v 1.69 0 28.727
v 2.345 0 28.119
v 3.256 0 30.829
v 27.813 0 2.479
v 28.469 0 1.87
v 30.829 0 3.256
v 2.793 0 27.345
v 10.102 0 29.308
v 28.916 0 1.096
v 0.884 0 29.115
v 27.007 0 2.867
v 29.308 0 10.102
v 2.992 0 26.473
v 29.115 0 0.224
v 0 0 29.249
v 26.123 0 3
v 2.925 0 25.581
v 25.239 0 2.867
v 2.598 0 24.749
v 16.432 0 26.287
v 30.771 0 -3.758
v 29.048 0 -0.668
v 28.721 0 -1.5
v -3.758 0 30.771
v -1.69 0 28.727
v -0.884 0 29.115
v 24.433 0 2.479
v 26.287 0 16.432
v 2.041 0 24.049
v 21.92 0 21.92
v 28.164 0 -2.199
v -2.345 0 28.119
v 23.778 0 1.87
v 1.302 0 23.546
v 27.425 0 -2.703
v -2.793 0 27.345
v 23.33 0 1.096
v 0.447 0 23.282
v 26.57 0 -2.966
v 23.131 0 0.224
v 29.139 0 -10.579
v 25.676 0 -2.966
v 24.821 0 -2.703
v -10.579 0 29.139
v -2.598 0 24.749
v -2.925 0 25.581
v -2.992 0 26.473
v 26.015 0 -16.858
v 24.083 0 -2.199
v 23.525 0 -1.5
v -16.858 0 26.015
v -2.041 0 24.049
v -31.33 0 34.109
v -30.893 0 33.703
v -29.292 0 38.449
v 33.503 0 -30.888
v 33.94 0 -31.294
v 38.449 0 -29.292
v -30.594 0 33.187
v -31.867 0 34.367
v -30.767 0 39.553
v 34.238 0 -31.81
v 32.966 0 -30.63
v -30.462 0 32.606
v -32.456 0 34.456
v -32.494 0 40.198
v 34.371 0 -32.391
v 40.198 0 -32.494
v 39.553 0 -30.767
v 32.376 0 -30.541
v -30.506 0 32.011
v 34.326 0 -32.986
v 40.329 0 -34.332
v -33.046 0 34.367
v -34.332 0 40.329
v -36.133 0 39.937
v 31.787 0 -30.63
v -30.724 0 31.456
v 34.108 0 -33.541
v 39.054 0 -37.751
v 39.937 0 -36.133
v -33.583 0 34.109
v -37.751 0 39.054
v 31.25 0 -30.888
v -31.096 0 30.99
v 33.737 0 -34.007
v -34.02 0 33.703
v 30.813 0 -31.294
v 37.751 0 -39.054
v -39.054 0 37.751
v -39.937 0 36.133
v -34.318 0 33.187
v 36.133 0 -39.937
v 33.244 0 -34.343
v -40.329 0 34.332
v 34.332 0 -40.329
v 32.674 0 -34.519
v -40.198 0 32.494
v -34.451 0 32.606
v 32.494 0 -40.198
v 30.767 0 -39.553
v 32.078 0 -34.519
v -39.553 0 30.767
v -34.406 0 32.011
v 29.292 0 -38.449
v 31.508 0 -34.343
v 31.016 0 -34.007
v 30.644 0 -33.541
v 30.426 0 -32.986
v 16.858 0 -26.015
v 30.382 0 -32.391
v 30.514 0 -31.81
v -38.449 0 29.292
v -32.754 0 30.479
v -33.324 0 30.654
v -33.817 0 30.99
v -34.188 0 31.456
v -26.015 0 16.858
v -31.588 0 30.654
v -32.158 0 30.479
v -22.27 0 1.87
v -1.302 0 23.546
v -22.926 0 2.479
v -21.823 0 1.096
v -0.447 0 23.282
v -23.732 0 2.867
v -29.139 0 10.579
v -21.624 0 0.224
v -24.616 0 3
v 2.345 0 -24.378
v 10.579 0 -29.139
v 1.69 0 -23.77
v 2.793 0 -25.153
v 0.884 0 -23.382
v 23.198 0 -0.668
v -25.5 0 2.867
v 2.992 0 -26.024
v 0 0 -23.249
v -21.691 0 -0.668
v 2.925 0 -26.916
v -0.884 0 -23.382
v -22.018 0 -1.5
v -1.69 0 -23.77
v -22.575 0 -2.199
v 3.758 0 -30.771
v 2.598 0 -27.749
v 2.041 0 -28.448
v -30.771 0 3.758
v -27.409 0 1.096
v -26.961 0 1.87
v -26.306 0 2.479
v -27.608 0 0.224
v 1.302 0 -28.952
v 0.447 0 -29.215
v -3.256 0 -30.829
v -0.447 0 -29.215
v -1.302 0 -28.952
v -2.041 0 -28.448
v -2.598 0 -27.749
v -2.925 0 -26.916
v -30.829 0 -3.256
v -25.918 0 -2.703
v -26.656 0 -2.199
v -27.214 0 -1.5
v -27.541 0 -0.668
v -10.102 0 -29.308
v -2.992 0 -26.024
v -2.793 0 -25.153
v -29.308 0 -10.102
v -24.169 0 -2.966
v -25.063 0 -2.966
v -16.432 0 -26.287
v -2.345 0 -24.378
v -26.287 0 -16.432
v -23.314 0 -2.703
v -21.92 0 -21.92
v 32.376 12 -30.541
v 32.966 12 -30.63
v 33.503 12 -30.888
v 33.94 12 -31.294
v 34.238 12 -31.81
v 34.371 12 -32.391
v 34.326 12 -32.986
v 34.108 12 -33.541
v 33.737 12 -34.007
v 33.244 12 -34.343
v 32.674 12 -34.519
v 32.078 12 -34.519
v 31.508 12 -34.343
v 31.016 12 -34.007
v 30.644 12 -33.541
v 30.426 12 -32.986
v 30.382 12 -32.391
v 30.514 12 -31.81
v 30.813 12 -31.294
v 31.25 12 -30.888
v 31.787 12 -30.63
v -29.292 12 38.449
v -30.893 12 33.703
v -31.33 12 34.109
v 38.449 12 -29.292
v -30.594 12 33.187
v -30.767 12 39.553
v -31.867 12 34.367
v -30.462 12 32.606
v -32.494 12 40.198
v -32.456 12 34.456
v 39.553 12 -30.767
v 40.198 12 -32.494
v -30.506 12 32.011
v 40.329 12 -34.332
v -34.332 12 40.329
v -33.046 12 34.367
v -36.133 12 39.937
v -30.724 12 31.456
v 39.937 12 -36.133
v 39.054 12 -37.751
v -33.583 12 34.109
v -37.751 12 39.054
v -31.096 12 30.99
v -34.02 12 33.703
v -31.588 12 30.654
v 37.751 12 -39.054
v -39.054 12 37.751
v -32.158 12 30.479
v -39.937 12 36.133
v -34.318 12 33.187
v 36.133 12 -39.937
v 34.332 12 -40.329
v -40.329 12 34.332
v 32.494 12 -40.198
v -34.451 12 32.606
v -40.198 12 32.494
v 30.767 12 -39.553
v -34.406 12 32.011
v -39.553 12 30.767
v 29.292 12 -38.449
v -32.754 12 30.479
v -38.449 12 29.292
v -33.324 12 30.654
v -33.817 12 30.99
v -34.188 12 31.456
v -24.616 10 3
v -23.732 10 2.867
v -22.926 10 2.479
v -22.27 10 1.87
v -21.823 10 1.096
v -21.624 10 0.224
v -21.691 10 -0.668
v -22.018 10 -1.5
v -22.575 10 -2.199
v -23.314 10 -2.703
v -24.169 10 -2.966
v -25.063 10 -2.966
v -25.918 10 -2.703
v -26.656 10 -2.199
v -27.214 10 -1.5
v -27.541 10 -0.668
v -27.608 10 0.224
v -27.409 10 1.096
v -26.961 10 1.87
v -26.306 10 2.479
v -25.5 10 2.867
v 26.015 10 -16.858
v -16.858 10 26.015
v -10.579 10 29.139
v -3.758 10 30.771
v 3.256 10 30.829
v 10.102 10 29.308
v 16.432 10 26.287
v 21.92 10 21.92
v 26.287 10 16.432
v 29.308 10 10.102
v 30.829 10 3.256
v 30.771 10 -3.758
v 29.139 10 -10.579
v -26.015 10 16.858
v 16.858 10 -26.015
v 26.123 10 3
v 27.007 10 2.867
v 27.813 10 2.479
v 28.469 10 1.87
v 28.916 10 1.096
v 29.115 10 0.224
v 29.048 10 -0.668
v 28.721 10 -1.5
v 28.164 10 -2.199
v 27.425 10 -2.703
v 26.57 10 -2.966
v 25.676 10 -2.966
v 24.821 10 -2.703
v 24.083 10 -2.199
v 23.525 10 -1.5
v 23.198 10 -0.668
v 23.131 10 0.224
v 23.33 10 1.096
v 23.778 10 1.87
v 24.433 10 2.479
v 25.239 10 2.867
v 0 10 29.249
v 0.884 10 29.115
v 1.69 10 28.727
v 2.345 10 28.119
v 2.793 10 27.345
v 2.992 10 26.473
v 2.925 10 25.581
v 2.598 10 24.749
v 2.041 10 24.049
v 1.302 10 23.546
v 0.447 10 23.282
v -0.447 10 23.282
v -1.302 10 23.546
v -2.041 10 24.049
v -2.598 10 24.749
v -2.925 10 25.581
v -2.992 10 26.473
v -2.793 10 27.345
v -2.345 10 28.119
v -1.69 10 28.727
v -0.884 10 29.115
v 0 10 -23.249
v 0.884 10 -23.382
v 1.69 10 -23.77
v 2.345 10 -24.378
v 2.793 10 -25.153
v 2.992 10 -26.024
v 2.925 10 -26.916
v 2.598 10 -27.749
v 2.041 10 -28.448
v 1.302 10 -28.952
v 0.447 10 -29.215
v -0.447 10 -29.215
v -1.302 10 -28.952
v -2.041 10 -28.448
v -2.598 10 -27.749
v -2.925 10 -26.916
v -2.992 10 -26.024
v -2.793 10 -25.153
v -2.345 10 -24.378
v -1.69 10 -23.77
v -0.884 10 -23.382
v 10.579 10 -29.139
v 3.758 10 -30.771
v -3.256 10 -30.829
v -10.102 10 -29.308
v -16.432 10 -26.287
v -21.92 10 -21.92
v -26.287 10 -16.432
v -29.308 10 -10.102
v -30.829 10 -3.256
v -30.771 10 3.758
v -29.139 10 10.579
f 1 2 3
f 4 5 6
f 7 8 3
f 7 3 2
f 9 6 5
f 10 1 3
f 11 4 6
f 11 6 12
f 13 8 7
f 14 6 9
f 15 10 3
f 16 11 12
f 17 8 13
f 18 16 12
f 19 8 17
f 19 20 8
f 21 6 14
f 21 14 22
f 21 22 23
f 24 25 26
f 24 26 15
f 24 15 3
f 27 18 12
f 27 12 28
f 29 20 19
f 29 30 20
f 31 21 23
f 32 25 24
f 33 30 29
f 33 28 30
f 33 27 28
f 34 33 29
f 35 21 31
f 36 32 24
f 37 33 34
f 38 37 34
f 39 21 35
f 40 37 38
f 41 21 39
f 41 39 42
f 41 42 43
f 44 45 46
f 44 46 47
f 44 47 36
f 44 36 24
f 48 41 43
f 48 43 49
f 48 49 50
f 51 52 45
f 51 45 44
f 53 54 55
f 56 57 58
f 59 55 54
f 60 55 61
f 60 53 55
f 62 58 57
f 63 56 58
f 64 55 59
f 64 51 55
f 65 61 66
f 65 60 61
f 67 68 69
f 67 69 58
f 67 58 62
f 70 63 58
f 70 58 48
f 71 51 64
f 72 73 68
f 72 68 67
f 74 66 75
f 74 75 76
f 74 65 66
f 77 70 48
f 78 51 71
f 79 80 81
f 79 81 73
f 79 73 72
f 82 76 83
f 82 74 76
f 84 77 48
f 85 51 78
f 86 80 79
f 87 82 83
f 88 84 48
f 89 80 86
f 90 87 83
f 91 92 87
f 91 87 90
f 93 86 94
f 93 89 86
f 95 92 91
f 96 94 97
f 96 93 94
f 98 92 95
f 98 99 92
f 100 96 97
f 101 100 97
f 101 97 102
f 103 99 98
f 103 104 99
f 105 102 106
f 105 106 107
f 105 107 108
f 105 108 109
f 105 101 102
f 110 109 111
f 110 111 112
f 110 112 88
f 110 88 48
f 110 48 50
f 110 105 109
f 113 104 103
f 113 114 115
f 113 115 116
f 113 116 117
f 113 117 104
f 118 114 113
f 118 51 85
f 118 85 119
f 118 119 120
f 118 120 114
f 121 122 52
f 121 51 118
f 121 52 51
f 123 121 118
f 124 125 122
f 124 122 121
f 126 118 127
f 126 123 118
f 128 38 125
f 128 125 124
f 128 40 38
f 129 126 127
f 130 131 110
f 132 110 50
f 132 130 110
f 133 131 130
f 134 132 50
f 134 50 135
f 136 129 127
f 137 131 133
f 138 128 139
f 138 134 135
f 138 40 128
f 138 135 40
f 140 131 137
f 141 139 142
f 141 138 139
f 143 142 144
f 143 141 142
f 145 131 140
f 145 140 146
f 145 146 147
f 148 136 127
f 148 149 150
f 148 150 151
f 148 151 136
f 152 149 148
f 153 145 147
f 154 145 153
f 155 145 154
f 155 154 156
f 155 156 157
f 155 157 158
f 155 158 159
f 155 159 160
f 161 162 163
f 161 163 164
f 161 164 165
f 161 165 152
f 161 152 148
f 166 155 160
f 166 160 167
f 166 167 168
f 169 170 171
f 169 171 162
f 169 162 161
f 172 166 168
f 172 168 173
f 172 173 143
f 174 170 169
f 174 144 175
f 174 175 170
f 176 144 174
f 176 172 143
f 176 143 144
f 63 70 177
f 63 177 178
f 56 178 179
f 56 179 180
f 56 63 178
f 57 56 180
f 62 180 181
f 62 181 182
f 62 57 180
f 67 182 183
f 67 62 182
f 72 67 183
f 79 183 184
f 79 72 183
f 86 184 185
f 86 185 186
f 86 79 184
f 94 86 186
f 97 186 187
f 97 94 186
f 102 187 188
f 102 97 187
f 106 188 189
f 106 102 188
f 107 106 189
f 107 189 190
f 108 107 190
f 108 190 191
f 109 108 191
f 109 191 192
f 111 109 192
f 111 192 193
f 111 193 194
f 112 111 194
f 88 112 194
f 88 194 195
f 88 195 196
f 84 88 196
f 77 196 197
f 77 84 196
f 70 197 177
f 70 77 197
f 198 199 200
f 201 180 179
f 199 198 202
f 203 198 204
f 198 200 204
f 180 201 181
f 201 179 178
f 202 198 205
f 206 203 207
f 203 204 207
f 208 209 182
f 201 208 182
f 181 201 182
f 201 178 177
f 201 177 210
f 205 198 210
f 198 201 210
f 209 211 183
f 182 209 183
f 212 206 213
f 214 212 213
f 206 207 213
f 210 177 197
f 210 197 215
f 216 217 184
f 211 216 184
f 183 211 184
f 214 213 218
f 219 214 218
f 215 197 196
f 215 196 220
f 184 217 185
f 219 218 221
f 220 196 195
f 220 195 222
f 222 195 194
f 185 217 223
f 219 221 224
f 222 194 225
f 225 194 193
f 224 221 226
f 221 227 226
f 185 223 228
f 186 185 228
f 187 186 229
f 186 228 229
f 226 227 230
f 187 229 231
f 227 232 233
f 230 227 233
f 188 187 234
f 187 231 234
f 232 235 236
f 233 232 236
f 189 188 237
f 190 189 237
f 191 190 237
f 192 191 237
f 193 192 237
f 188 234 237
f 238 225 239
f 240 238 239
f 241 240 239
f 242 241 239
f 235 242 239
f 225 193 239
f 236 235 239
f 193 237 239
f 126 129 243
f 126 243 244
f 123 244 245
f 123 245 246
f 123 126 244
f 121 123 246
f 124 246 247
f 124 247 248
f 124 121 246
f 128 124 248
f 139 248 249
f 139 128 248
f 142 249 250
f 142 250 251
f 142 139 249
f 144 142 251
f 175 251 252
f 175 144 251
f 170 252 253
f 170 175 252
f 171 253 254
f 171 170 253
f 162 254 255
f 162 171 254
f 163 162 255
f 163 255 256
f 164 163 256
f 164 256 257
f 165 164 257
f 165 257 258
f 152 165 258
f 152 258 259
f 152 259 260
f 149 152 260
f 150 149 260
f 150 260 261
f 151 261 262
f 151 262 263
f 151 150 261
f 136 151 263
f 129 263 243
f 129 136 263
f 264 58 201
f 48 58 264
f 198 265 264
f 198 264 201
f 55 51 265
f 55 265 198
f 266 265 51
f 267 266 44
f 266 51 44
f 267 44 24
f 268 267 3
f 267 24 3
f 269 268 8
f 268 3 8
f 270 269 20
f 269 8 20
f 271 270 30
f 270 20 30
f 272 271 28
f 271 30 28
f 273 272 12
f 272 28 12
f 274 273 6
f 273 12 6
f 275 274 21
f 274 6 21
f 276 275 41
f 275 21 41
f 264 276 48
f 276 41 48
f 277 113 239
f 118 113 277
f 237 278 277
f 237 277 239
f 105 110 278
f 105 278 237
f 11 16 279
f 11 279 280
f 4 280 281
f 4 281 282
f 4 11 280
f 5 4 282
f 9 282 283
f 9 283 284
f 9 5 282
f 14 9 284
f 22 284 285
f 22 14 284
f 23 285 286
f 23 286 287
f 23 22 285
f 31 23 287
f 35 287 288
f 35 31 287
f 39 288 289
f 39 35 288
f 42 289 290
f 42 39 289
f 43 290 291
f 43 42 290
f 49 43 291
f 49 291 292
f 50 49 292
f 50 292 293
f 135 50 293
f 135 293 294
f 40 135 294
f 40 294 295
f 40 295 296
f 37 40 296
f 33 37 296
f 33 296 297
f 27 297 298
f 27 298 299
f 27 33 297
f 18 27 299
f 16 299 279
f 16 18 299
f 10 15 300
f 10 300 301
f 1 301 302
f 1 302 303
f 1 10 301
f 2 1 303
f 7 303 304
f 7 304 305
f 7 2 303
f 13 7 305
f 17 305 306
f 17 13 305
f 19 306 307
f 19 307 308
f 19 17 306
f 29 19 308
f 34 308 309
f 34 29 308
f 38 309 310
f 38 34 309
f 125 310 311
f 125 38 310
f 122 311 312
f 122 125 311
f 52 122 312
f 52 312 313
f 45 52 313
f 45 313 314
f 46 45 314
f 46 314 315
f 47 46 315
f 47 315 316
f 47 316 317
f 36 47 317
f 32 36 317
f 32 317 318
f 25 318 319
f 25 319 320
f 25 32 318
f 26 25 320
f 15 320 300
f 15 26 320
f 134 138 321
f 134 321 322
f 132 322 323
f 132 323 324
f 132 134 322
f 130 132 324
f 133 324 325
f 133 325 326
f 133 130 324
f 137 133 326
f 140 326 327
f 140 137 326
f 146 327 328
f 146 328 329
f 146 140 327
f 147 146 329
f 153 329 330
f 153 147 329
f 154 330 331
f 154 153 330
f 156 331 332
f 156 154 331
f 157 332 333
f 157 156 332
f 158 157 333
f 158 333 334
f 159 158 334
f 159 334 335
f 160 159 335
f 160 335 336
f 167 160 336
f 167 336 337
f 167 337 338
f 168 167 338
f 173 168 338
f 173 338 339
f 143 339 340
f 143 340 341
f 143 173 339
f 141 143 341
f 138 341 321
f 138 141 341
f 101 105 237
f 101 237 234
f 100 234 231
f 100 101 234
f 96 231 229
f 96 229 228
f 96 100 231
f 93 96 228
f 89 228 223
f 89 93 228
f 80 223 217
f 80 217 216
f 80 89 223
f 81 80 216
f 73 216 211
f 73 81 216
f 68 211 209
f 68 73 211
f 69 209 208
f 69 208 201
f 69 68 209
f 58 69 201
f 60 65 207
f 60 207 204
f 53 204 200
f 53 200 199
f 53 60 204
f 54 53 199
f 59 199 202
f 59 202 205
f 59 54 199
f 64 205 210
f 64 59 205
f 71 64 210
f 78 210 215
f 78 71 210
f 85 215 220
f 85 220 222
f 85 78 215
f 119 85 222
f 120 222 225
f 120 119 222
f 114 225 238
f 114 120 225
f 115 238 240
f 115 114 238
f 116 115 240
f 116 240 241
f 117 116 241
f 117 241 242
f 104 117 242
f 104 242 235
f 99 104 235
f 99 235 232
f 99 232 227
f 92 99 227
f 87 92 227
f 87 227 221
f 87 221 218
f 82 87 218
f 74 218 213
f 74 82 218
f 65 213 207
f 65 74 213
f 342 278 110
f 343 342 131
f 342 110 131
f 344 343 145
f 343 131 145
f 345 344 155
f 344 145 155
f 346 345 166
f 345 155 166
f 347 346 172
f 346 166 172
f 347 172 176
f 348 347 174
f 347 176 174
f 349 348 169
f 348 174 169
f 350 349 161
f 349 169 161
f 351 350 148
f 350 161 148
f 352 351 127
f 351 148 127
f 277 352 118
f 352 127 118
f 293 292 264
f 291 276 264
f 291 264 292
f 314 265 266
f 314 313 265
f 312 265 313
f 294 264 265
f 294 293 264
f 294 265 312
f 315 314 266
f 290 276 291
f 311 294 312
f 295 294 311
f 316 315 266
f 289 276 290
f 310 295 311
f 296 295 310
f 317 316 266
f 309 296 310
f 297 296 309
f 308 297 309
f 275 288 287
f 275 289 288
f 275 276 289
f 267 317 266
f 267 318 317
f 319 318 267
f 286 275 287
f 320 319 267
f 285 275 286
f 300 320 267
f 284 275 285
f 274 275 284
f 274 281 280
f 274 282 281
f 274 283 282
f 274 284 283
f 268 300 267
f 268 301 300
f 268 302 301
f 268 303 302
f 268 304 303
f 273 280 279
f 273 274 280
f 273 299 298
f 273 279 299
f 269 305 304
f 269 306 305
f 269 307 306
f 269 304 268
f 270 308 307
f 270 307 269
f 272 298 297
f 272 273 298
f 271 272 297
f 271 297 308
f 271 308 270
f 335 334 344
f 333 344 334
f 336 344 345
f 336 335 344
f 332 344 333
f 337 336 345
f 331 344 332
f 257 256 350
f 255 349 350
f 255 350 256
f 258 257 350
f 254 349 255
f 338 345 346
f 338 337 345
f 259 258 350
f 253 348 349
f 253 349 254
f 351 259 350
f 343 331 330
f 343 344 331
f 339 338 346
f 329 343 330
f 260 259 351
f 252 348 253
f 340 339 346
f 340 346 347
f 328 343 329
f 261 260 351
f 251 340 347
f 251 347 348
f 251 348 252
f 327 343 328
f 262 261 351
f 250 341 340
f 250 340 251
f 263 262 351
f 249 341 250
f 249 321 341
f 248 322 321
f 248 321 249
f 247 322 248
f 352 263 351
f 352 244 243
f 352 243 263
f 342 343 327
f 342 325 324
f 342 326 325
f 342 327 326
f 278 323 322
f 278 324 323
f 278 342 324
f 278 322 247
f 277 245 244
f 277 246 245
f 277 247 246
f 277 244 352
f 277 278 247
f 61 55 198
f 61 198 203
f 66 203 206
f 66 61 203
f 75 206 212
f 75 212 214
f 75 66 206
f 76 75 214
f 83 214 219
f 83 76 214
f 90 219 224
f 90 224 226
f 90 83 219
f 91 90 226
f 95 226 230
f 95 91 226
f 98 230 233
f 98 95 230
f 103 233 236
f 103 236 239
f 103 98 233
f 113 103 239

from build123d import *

# Parameters (mm, degrees)
SKETCH6_R           = 31
BOSS_EXTRUDE3_DEPTH = 10
SKETCH7_R           = 3
CUT_EXTRUDE4_DEPTH  = 10
SKETCH8_R           = 2
BOSS_EXTRUDE8_DEPTH = 12


with BuildPart() as part:
    # Sketch6 → Boss-Extrude3 (new body)
    with BuildSketch(Plane(origin=(0, 0, 0), x_dir=(1, 0, 0), z_dir=(0, 1, 0))):
        with Locations(Location((0, 0, 0), (0, 0, 270))):
            Circle(SKETCH6_R)
    extrude(amount=BOSS_EXTRUDE3_DEPTH)

    # Sketch7 → Cut-Extrude4 (cut)
    with BuildSketch(Plane(origin=(0, 0, 0), x_dir=(1, 0, 0), z_dir=(0, 1, 0))):
        with Locations(Location((0, 26.248619222, 0), (0, 0, 270))):
            Circle(SKETCH7_R)
        with Locations(Location((26.123027742, 0, 0), (0, 0, 270))):
            Circle(SKETCH7_R)
        with Locations(Location((-24.615929988, 0, 0), (0, 0, 270))):
            Circle(SKETCH7_R)
        with Locations(Location((0, -26.248619222, 0), (0, 0, 270))):
            Circle(SKETCH7_R)
    extrude(amount=CUT_EXTRUDE4_DEPTH, mode=Mode.SUBTRACT)

    # Sketch8 → Boss-Extrude8 (add)
    with BuildSketch(Plane(origin=(0, 0, 0), x_dir=(1, 0, 0), z_dir=(0, 1, 0))):
        with BuildLine():
            Line((-38.449006602, -29.291772781), (29.291772781, 38.449006602))
            ThreePointArc((29.291772781, 38.449006602), (38.449006602, 38.449006602), (38.449006602, 29.291772781))
            Line((38.449006602, 29.291772781), (-29.291772781, -38.449006602))
            ThreePointArc((-29.291772781, -38.449006602), (-38.449006602, -38.449006602), (-38.449006602, -29.291772781))
        make_face()
        with Locations(Location((32.376246773, 32.540902219, 0), (0, 0, 270))):
            Circle(SKETCH8_R, mode=Mode.SUBTRACT)
        with Locations(Location((-32.456176129, -32.456176129, 0), (0, 0, 270))):
            Circle(SKETCH8_R, mode=Mode.SUBTRACT)
    extrude(amount=BOSS_EXTRUDE8_DEPTH)


solid = part.part
